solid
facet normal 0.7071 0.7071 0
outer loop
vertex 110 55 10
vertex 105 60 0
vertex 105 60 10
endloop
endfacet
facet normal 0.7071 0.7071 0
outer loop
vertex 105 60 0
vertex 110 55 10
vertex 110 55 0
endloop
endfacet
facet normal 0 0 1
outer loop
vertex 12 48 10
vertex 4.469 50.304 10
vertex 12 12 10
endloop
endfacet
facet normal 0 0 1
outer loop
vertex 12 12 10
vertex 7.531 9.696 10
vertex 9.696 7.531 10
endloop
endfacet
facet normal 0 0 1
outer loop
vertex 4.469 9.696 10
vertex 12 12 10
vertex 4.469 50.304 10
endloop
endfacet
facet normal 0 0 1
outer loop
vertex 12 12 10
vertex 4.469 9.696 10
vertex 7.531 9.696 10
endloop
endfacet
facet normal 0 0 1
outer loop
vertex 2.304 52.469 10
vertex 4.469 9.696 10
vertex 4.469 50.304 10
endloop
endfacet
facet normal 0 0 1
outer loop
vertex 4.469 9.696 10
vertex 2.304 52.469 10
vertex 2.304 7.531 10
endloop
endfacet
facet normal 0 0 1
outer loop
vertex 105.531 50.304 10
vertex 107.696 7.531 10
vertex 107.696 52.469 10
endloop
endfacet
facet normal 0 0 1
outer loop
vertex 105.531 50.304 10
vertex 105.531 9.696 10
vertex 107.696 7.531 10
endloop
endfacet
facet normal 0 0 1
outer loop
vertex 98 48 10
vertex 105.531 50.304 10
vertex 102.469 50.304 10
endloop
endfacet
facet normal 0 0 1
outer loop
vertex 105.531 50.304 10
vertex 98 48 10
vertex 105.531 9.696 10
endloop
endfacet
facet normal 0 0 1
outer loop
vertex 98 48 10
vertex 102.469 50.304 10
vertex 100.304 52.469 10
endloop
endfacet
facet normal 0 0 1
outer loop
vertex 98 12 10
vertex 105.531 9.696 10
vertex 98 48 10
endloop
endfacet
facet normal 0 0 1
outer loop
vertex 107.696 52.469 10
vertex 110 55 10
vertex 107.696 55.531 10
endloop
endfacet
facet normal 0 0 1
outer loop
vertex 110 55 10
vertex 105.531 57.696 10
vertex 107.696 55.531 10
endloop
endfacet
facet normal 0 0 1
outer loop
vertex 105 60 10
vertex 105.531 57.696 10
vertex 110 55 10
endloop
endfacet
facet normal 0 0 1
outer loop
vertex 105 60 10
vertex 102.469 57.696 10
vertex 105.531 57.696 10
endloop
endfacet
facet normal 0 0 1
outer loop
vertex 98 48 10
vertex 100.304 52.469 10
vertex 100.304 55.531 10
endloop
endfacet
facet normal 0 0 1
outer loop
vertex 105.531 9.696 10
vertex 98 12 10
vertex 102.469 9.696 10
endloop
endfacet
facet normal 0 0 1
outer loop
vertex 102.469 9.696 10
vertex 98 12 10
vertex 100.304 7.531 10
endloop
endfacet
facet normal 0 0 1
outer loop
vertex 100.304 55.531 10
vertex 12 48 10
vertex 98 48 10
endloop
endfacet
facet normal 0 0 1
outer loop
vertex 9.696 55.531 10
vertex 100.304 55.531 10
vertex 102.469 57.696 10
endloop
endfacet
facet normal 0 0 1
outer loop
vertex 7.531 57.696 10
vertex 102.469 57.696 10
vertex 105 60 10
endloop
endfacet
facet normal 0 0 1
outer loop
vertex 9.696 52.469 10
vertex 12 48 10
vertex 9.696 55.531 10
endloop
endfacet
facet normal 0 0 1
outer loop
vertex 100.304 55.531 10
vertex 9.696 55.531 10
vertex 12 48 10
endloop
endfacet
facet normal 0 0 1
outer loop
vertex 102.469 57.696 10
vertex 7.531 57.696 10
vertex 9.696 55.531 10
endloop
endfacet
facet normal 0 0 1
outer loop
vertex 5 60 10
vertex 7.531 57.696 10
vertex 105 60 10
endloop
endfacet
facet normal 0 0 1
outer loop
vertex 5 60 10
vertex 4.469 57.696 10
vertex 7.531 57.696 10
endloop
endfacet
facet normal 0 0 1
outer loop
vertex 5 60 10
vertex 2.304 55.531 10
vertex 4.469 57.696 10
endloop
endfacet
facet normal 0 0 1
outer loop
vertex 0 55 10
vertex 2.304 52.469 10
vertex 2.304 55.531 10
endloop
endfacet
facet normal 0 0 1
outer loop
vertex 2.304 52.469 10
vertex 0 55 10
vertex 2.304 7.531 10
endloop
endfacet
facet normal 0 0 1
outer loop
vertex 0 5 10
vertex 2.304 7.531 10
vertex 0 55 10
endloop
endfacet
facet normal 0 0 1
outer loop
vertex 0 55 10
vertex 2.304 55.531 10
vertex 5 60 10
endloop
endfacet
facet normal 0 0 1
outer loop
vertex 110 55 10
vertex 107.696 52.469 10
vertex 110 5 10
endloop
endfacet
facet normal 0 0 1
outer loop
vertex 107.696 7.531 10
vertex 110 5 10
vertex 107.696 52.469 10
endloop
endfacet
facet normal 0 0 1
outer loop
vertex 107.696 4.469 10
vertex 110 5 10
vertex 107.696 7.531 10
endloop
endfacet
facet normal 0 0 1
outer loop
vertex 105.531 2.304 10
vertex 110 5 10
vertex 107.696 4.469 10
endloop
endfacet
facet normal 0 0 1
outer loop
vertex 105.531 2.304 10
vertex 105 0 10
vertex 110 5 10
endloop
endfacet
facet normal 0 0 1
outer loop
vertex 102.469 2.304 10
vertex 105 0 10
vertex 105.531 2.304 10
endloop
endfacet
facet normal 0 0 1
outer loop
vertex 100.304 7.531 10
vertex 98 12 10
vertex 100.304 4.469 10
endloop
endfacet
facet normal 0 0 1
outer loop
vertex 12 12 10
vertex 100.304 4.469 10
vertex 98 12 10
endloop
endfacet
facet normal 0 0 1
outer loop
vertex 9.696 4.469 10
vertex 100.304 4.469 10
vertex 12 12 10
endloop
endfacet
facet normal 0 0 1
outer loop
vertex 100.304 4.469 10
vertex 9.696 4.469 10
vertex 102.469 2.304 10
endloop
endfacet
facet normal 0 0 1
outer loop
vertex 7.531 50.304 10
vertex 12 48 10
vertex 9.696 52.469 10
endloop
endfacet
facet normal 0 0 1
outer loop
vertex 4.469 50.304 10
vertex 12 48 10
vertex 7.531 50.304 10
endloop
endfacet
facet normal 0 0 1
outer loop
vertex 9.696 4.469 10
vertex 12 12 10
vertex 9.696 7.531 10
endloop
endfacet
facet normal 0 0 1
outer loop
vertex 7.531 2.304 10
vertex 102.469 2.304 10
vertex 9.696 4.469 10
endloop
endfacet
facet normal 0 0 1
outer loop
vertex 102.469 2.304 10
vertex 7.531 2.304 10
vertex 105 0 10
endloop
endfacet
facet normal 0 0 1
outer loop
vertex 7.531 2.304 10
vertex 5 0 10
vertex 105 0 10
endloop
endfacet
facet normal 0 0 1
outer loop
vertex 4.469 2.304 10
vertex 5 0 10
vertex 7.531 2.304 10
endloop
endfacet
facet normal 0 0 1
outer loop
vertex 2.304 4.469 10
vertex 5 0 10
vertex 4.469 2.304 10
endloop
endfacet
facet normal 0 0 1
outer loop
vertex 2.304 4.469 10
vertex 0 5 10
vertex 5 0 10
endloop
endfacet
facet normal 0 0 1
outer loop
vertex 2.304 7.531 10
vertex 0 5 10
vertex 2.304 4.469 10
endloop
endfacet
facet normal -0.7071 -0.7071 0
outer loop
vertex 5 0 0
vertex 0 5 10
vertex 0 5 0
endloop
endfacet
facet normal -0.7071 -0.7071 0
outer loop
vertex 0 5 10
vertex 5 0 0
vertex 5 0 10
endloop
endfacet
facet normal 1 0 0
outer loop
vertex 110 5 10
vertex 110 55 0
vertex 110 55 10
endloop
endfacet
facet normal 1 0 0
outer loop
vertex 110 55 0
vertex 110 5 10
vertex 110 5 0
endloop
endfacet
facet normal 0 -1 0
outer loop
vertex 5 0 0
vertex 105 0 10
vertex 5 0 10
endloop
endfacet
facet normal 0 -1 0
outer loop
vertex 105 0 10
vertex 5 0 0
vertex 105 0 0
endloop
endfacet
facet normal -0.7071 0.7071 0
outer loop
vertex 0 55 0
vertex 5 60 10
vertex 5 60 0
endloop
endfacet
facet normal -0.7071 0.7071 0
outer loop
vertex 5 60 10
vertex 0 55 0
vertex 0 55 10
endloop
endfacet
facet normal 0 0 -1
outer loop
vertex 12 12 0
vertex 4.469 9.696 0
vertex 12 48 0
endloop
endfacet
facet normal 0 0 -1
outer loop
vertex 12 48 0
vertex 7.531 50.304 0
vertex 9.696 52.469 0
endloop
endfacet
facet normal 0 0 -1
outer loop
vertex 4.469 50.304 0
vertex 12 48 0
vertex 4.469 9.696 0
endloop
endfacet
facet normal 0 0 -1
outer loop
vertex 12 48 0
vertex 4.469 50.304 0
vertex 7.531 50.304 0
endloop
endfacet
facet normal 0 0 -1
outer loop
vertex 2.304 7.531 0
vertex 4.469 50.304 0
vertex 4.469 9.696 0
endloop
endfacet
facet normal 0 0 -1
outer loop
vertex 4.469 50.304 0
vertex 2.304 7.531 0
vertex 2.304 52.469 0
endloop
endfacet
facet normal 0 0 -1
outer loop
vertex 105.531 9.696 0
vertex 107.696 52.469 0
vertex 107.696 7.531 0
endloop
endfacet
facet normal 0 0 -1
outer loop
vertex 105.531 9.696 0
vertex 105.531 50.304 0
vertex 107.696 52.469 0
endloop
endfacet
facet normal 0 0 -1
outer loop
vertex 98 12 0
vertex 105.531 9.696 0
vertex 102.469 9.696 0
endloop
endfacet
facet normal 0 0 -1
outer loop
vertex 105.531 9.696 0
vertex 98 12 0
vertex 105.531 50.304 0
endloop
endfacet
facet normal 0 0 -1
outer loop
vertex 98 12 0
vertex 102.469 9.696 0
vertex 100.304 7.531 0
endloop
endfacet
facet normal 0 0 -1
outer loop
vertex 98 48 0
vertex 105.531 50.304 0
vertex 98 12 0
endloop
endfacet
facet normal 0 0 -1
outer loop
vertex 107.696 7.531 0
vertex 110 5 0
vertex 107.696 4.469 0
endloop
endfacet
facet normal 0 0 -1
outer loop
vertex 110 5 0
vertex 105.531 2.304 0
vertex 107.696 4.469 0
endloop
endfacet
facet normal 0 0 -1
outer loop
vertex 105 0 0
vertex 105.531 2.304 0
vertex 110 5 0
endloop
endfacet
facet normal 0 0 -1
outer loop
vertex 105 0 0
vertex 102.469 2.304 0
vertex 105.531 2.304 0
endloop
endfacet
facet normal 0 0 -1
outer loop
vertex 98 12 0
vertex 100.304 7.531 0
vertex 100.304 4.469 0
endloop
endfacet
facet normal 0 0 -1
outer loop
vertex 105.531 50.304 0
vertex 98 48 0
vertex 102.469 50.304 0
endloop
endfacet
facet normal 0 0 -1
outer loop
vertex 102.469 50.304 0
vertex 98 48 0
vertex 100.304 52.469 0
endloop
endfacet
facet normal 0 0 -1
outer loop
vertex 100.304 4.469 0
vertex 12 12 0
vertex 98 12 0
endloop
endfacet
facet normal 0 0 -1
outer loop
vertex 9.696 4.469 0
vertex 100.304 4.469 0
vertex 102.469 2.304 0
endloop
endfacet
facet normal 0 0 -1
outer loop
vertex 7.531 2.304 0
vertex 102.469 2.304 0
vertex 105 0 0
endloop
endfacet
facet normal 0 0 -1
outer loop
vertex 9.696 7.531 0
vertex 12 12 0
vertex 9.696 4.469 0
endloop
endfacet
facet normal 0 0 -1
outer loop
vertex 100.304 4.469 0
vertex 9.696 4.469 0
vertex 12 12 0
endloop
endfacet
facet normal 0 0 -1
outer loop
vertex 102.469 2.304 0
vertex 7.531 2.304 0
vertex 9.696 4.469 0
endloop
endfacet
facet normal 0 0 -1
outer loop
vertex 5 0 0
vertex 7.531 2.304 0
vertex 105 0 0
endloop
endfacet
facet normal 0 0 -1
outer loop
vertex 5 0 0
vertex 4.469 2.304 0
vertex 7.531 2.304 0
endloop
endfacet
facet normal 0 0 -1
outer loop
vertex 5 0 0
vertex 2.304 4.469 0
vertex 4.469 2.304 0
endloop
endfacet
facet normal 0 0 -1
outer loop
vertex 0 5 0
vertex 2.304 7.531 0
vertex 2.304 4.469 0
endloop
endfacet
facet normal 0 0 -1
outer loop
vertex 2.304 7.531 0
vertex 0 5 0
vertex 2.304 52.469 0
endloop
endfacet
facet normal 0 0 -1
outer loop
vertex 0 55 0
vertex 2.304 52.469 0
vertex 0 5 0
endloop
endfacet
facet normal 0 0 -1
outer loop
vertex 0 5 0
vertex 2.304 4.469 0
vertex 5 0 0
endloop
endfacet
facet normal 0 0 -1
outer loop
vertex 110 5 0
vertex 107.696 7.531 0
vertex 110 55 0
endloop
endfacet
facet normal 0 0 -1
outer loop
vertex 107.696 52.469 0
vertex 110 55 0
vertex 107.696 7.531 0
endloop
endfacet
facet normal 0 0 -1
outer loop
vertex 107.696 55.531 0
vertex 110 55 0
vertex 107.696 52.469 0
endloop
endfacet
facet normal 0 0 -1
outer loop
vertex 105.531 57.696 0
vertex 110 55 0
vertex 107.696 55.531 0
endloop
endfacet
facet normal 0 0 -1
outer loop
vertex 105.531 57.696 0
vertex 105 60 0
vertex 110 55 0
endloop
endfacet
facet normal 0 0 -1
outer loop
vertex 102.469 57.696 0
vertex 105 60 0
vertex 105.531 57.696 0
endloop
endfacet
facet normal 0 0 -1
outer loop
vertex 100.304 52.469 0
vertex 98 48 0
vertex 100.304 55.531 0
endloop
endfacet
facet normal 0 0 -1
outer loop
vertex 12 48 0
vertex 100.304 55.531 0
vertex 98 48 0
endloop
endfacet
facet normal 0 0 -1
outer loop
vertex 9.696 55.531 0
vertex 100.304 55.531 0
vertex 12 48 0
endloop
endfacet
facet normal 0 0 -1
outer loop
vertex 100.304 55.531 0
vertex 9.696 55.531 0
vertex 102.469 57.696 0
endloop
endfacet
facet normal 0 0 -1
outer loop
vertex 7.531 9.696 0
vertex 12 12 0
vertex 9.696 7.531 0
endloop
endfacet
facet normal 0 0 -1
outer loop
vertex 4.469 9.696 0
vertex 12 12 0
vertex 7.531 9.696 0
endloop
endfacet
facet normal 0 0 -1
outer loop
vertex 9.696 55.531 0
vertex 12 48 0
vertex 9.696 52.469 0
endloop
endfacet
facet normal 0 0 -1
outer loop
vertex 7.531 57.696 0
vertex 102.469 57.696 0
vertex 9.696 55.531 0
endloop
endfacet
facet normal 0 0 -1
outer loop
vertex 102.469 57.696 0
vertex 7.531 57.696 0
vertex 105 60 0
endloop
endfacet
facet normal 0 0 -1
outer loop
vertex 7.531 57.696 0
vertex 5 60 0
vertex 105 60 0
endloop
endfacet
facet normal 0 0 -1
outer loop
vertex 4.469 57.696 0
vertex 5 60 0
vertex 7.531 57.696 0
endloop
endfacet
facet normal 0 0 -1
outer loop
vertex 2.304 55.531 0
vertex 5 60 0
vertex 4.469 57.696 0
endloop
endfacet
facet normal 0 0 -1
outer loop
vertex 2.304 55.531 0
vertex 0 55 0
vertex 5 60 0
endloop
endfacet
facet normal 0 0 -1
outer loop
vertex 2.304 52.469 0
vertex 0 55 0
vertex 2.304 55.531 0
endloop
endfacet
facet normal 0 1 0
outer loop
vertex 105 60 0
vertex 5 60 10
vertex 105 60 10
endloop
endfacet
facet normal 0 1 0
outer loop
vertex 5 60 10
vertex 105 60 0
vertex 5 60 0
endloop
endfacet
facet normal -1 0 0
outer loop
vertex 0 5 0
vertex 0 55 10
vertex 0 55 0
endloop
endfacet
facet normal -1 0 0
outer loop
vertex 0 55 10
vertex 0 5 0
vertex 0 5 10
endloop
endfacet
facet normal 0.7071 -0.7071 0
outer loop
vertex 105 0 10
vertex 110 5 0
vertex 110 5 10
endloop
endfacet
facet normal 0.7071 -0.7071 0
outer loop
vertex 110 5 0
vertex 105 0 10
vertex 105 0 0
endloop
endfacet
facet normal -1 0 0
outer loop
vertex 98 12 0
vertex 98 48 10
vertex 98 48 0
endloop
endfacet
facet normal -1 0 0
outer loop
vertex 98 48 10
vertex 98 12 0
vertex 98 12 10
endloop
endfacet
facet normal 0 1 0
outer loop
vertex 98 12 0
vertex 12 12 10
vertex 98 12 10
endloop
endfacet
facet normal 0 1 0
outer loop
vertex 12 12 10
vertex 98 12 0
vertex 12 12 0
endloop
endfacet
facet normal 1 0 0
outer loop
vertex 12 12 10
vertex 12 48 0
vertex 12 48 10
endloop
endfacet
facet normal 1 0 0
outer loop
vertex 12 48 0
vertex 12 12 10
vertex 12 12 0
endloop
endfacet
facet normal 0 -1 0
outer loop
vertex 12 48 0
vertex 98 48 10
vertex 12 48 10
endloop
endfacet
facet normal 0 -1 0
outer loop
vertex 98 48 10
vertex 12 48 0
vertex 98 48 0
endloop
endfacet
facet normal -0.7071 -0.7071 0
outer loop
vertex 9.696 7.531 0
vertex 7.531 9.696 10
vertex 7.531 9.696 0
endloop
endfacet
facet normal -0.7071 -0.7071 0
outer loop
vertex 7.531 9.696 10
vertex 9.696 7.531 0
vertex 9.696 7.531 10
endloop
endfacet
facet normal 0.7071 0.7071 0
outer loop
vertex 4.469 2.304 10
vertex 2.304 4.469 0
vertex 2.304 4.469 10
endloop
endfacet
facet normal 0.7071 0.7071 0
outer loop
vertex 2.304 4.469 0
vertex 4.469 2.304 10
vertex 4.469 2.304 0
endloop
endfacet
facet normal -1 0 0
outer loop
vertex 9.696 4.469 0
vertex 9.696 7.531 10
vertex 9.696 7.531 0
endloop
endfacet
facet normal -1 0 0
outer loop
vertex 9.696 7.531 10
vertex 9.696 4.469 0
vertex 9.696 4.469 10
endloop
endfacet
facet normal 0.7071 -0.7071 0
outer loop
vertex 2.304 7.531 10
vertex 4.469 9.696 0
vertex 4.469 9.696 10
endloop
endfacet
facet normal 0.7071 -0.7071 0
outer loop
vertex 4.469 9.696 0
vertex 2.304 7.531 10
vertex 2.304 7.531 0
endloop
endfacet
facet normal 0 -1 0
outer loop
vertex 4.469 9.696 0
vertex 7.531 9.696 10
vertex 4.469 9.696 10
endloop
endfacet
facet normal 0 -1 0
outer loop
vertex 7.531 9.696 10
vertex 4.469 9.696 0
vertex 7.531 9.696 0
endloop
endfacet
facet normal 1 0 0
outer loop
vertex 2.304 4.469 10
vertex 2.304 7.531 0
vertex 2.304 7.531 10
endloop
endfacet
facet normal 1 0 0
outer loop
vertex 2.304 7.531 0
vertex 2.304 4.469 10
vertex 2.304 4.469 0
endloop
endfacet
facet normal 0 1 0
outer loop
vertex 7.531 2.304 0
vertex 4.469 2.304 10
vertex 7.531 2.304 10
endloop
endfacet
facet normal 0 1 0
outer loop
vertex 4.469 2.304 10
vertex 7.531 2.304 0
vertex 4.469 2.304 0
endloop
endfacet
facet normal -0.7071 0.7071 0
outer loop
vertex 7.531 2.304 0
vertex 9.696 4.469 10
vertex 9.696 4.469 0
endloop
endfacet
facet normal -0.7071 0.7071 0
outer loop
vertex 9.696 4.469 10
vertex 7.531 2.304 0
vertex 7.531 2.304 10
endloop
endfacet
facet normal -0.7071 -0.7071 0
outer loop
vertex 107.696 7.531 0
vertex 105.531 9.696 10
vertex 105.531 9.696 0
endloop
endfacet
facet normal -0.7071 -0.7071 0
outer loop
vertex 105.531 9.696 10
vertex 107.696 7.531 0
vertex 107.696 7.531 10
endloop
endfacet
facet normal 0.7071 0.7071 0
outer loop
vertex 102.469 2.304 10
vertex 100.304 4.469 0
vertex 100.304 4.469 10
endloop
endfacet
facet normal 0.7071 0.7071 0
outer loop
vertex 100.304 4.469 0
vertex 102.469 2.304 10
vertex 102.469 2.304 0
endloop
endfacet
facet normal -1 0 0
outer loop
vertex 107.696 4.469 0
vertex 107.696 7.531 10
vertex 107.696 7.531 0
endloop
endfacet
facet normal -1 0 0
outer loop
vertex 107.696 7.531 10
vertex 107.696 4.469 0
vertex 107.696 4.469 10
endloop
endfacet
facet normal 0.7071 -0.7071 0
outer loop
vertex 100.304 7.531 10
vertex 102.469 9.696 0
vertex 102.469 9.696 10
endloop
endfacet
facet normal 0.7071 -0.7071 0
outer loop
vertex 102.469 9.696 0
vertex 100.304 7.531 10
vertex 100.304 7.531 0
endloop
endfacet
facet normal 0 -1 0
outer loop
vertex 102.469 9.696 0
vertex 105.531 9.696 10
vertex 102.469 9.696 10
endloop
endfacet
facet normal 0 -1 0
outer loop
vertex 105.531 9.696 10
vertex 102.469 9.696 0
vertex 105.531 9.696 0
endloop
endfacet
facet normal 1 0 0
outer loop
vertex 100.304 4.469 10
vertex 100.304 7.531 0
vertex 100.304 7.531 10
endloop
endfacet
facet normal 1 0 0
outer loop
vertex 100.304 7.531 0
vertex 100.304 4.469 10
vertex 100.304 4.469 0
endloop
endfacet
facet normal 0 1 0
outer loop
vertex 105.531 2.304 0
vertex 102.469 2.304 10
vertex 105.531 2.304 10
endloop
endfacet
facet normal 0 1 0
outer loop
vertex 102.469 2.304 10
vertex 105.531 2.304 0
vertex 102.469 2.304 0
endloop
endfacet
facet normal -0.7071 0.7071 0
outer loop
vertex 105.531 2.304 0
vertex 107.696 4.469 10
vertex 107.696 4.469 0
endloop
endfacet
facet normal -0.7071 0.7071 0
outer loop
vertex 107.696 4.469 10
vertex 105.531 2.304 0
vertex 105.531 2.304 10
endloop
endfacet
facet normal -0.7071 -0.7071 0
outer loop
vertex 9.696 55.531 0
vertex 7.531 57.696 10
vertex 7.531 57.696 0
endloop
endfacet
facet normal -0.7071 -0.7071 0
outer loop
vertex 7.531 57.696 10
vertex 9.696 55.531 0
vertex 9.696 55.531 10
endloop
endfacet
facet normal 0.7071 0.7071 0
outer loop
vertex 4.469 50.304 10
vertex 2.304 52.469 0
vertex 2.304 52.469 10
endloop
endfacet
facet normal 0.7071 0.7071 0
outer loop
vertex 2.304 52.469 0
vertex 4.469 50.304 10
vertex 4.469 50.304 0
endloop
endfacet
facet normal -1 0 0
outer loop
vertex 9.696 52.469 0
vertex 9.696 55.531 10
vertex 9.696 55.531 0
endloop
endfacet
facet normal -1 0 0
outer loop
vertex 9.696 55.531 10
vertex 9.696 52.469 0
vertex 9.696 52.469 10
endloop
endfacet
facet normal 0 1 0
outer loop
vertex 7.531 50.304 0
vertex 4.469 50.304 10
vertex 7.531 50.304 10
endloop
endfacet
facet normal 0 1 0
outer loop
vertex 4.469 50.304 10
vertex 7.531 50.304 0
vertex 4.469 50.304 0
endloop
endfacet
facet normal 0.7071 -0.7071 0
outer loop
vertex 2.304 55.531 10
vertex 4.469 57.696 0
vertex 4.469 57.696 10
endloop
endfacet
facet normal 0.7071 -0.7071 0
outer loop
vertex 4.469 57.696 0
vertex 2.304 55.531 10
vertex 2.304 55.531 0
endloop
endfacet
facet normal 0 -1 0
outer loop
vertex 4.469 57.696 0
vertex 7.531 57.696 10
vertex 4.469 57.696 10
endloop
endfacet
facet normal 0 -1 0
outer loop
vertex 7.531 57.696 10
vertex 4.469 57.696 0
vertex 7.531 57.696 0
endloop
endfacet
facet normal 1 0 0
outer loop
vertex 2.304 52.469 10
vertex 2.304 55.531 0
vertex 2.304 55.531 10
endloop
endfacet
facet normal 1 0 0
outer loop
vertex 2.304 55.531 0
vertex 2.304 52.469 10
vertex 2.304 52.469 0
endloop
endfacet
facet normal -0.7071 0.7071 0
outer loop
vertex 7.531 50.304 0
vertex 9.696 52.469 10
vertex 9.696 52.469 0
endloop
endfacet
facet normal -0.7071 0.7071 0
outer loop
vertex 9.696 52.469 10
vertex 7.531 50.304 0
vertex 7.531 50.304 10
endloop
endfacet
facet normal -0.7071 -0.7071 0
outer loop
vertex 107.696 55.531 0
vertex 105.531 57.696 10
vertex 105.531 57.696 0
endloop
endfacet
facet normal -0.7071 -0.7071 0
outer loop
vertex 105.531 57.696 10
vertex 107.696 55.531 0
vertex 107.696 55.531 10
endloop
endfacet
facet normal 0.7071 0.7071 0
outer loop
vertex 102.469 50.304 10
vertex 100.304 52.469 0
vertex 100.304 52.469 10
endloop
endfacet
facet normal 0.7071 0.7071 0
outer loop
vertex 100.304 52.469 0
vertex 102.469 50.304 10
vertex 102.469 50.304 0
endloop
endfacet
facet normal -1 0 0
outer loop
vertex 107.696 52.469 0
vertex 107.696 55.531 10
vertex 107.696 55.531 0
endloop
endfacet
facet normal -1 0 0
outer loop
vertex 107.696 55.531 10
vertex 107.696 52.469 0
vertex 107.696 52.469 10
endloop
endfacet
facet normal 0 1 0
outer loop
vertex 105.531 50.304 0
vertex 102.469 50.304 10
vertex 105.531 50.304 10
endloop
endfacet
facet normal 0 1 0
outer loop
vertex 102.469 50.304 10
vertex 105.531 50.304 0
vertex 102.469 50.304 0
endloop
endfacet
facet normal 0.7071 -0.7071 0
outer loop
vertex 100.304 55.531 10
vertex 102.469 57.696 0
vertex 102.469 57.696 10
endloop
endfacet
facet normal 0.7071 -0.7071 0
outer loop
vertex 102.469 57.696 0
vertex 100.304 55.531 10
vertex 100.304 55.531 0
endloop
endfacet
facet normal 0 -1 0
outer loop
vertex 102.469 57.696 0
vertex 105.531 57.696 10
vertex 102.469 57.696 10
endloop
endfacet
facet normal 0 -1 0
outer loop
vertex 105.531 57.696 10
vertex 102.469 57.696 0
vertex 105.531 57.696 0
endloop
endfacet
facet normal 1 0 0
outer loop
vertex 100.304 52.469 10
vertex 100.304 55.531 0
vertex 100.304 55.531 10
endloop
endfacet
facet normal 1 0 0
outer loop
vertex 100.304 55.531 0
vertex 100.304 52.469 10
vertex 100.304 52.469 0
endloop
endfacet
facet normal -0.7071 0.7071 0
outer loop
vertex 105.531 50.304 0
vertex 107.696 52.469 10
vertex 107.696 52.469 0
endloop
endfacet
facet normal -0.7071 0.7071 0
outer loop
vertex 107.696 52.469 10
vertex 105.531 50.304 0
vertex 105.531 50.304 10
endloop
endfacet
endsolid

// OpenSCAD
$fn = 32;
// target_bbox: 110, 60, 10
// ----------------------------------------------------------------------
// Frame plate: 110 x 60 frame, 12 mm rails
// ----------------------------------------------------------------------

// --- parameters (mm) ---
plate_l = 110;            // plate length, X
plate_w = 60;             // plate width, Y
plate_t = 10;             // plate thickness, Z (extrusion height)
corner_c = 5;             // corner chamfer
frame_bar = 12;           // frame rail width
bolt_r = 4;               // corner bolt window radius
bolt_inset = 6;           // bolt centre inset from the edges

win_l = plate_l - 2 * frame_bar;  // window length
win_w = plate_w - 2 * frame_bar;  // window width
bolt_d = 2 * bolt_r;  // corner hole diameter

profile = [[5, 0], [105, 0], [110, 5], [110, 55], [105, 60], [5, 60], [0, 55], [0, 5]];  // primary outline, 8 points, counter clockwise
void_1 = [[12, 12], [98, 12], [98, 48], [12, 48]];  // the window, 4 points
void_2 = [[9.696, 7.531], [7.531, 9.696], [4.469, 9.696], [2.304, 7.531], [2.304, 4.469], [4.469, 2.304], [7.531, 2.304], [9.696, 4.469]];  // corner bolt window, 8 points
void_3 = [[107.696, 7.531], [105.531, 9.696], [102.469, 9.696], [100.304, 7.531], [100.304, 4.469], [102.469, 2.304], [105.531, 2.304], [107.696, 4.469]];  // corner bolt window, 8 points
void_4 = [[9.696, 55.531], [7.531, 57.696], [4.469, 57.696], [2.304, 55.531], [2.304, 52.469], [4.469, 50.304], [7.531, 50.304], [9.696, 52.469]];  // corner bolt window, 8 points
void_5 = [[107.696, 55.531], [105.531, 57.696], [102.469, 57.696], [100.304, 55.531], [100.304, 52.469], [102.469, 50.304], [105.531, 50.304], [107.696, 52.469]];  // corner bolt window, 8 points

// --- the one profile operation ---
difference() {
  linear_extrude(height = plate_t) polygon(points = profile);
  translate([0, 0, -1])
    linear_extrude(height = plate_t + 2) polygon(points = void_1);
  translate([0, 0, -1])
    linear_extrude(height = plate_t + 2) polygon(points = void_2);
  translate([0, 0, -1])
    linear_extrude(height = plate_t + 2) polygon(points = void_3);
  translate([0, 0, -1])
    linear_extrude(height = plate_t + 2) polygon(points = void_4);
  translate([0, 0, -1])
    linear_extrude(height = plate_t + 2) polygon(points = void_5);
}
